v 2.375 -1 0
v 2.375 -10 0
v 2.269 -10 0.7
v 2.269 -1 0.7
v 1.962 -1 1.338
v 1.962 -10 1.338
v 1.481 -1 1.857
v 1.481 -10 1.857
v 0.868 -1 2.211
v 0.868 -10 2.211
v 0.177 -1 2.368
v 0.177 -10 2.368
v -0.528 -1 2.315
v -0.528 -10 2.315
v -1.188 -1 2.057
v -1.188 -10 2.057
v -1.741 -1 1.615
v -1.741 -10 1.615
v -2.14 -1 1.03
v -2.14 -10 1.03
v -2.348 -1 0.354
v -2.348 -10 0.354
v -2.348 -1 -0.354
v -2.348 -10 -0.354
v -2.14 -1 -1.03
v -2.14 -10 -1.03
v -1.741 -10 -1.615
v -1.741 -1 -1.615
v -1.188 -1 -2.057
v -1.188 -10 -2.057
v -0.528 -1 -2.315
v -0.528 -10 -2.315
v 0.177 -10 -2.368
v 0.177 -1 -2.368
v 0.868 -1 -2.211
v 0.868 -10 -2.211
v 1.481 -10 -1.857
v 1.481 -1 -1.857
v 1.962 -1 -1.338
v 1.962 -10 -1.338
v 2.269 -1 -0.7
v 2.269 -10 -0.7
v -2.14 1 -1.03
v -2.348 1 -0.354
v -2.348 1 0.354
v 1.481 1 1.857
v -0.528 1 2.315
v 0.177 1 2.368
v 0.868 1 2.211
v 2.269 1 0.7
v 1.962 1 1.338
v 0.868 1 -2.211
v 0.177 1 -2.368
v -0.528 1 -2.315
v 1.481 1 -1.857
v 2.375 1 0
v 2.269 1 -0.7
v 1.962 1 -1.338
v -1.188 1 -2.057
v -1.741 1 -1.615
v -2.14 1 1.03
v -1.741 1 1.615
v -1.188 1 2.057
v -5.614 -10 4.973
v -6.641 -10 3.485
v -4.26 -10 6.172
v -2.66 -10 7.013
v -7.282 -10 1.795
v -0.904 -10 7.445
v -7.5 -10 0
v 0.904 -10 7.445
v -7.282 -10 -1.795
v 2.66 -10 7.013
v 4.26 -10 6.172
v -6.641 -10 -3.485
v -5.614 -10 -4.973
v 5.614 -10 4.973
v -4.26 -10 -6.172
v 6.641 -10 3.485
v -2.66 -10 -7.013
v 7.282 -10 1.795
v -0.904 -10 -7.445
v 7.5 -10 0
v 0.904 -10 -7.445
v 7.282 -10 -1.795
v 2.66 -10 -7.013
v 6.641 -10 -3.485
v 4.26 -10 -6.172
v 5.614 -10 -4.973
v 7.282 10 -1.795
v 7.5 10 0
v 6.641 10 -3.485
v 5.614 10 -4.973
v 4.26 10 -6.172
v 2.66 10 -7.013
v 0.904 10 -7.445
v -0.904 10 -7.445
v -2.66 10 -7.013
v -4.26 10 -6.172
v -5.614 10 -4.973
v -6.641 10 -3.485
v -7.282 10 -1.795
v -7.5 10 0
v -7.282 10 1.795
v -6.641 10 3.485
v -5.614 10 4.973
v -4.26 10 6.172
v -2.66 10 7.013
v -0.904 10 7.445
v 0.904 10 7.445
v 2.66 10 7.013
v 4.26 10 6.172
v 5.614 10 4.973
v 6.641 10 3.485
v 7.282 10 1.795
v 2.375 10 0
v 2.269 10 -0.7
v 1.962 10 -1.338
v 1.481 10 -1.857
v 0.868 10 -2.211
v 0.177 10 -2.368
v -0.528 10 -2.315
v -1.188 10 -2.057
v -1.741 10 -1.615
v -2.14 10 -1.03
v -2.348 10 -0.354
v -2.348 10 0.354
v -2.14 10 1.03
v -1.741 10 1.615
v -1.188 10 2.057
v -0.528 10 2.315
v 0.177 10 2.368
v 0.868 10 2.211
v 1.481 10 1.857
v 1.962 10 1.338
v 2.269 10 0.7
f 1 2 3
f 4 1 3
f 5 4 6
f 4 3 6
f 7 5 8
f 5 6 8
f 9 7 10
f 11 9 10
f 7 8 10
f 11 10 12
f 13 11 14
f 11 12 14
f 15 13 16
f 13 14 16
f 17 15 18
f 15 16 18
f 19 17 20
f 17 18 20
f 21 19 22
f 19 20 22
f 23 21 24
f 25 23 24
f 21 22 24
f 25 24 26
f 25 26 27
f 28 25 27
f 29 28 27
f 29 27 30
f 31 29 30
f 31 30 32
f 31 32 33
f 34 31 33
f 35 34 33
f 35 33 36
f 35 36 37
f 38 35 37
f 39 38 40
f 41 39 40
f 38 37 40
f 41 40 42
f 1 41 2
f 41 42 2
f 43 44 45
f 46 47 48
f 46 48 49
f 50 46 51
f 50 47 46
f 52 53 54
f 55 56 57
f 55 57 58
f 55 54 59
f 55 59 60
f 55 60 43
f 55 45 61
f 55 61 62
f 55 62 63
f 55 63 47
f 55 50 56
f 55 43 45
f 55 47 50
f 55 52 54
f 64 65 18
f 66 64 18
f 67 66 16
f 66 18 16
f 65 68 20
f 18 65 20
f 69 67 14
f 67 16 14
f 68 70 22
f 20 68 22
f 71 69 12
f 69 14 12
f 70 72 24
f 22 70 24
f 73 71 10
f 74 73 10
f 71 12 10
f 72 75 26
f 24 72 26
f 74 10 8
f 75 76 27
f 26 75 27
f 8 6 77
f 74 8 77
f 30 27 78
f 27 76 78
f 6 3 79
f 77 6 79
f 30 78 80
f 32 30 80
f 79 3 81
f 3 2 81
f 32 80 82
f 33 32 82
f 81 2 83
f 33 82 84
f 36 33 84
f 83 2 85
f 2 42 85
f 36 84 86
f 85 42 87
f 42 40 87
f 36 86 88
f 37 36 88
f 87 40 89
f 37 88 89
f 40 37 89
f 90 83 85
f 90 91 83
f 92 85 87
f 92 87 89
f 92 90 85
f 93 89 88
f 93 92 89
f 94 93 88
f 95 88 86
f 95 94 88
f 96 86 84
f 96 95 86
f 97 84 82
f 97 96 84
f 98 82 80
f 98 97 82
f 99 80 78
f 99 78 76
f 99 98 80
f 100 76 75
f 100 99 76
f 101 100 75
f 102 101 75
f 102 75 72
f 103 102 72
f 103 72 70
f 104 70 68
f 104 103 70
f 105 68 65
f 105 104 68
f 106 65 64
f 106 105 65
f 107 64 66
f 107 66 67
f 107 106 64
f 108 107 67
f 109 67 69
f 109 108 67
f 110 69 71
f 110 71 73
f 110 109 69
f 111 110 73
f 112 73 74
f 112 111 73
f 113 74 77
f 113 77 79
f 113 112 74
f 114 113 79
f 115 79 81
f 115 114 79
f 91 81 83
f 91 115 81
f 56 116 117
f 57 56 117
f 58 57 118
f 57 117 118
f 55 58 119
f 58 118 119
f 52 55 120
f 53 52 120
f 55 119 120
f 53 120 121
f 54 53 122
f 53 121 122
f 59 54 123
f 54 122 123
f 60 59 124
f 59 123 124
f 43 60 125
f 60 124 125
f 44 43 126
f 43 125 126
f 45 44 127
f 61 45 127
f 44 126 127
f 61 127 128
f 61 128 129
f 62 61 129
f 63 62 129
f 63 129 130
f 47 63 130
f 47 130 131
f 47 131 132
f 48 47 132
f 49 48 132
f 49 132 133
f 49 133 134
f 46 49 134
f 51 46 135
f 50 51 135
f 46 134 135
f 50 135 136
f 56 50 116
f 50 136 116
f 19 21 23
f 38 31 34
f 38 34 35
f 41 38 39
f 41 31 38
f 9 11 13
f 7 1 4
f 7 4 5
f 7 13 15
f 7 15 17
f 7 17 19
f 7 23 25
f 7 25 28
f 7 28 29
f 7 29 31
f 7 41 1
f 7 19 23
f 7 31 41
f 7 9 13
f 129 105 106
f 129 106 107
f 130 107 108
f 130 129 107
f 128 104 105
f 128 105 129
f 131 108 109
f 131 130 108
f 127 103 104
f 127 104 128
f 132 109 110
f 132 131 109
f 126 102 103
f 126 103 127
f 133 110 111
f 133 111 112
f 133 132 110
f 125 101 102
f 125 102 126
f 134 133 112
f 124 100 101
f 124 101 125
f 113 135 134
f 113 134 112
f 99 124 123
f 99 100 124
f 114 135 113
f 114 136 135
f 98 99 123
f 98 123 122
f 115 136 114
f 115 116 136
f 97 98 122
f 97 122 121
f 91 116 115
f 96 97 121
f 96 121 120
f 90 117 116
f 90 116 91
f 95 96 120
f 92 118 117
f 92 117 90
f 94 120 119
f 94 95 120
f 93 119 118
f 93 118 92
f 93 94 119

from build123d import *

# Parameters (mm, degrees)
SKETCH1_R           = 7.5
BOSS_EXTRUDE1_DEPTH = 10
SKETCH2_R           = 2.375
CUT_EXTRUDE1_DEPTH  = 9
SKETCH3_R           = 2.375
CUT_EXTRUDE2_DEPTH  = 9


with BuildPart() as part:
    # Sketch1 → Boss-Extrude1 (new body, symmetric)
    with BuildSketch(Plane(origin=(0, 0, 0), x_dir=(1, 0, 0), z_dir=(0, 1, 0))):
        Circle(SKETCH1_R)
    extrude(amount=BOSS_EXTRUDE1_DEPTH, both=True)

    # Sketch2 → Cut-Extrude1 (cut)
    with BuildSketch(Plane(origin=(0, 10, 0), x_dir=(1, 0, 0), z_dir=(0, 1, 0))):
        Circle(SKETCH2_R)
    extrude(amount=-CUT_EXTRUDE1_DEPTH, mode=Mode.SUBTRACT)

    # Sketch3 → Cut-Extrude2 (cut)
    with BuildSketch(Plane.XZ.offset(10)):
        Circle(SKETCH3_R)
    extrude(amount=-CUT_EXTRUDE2_DEPTH, mode=Mode.SUBTRACT)


solid = part.part
